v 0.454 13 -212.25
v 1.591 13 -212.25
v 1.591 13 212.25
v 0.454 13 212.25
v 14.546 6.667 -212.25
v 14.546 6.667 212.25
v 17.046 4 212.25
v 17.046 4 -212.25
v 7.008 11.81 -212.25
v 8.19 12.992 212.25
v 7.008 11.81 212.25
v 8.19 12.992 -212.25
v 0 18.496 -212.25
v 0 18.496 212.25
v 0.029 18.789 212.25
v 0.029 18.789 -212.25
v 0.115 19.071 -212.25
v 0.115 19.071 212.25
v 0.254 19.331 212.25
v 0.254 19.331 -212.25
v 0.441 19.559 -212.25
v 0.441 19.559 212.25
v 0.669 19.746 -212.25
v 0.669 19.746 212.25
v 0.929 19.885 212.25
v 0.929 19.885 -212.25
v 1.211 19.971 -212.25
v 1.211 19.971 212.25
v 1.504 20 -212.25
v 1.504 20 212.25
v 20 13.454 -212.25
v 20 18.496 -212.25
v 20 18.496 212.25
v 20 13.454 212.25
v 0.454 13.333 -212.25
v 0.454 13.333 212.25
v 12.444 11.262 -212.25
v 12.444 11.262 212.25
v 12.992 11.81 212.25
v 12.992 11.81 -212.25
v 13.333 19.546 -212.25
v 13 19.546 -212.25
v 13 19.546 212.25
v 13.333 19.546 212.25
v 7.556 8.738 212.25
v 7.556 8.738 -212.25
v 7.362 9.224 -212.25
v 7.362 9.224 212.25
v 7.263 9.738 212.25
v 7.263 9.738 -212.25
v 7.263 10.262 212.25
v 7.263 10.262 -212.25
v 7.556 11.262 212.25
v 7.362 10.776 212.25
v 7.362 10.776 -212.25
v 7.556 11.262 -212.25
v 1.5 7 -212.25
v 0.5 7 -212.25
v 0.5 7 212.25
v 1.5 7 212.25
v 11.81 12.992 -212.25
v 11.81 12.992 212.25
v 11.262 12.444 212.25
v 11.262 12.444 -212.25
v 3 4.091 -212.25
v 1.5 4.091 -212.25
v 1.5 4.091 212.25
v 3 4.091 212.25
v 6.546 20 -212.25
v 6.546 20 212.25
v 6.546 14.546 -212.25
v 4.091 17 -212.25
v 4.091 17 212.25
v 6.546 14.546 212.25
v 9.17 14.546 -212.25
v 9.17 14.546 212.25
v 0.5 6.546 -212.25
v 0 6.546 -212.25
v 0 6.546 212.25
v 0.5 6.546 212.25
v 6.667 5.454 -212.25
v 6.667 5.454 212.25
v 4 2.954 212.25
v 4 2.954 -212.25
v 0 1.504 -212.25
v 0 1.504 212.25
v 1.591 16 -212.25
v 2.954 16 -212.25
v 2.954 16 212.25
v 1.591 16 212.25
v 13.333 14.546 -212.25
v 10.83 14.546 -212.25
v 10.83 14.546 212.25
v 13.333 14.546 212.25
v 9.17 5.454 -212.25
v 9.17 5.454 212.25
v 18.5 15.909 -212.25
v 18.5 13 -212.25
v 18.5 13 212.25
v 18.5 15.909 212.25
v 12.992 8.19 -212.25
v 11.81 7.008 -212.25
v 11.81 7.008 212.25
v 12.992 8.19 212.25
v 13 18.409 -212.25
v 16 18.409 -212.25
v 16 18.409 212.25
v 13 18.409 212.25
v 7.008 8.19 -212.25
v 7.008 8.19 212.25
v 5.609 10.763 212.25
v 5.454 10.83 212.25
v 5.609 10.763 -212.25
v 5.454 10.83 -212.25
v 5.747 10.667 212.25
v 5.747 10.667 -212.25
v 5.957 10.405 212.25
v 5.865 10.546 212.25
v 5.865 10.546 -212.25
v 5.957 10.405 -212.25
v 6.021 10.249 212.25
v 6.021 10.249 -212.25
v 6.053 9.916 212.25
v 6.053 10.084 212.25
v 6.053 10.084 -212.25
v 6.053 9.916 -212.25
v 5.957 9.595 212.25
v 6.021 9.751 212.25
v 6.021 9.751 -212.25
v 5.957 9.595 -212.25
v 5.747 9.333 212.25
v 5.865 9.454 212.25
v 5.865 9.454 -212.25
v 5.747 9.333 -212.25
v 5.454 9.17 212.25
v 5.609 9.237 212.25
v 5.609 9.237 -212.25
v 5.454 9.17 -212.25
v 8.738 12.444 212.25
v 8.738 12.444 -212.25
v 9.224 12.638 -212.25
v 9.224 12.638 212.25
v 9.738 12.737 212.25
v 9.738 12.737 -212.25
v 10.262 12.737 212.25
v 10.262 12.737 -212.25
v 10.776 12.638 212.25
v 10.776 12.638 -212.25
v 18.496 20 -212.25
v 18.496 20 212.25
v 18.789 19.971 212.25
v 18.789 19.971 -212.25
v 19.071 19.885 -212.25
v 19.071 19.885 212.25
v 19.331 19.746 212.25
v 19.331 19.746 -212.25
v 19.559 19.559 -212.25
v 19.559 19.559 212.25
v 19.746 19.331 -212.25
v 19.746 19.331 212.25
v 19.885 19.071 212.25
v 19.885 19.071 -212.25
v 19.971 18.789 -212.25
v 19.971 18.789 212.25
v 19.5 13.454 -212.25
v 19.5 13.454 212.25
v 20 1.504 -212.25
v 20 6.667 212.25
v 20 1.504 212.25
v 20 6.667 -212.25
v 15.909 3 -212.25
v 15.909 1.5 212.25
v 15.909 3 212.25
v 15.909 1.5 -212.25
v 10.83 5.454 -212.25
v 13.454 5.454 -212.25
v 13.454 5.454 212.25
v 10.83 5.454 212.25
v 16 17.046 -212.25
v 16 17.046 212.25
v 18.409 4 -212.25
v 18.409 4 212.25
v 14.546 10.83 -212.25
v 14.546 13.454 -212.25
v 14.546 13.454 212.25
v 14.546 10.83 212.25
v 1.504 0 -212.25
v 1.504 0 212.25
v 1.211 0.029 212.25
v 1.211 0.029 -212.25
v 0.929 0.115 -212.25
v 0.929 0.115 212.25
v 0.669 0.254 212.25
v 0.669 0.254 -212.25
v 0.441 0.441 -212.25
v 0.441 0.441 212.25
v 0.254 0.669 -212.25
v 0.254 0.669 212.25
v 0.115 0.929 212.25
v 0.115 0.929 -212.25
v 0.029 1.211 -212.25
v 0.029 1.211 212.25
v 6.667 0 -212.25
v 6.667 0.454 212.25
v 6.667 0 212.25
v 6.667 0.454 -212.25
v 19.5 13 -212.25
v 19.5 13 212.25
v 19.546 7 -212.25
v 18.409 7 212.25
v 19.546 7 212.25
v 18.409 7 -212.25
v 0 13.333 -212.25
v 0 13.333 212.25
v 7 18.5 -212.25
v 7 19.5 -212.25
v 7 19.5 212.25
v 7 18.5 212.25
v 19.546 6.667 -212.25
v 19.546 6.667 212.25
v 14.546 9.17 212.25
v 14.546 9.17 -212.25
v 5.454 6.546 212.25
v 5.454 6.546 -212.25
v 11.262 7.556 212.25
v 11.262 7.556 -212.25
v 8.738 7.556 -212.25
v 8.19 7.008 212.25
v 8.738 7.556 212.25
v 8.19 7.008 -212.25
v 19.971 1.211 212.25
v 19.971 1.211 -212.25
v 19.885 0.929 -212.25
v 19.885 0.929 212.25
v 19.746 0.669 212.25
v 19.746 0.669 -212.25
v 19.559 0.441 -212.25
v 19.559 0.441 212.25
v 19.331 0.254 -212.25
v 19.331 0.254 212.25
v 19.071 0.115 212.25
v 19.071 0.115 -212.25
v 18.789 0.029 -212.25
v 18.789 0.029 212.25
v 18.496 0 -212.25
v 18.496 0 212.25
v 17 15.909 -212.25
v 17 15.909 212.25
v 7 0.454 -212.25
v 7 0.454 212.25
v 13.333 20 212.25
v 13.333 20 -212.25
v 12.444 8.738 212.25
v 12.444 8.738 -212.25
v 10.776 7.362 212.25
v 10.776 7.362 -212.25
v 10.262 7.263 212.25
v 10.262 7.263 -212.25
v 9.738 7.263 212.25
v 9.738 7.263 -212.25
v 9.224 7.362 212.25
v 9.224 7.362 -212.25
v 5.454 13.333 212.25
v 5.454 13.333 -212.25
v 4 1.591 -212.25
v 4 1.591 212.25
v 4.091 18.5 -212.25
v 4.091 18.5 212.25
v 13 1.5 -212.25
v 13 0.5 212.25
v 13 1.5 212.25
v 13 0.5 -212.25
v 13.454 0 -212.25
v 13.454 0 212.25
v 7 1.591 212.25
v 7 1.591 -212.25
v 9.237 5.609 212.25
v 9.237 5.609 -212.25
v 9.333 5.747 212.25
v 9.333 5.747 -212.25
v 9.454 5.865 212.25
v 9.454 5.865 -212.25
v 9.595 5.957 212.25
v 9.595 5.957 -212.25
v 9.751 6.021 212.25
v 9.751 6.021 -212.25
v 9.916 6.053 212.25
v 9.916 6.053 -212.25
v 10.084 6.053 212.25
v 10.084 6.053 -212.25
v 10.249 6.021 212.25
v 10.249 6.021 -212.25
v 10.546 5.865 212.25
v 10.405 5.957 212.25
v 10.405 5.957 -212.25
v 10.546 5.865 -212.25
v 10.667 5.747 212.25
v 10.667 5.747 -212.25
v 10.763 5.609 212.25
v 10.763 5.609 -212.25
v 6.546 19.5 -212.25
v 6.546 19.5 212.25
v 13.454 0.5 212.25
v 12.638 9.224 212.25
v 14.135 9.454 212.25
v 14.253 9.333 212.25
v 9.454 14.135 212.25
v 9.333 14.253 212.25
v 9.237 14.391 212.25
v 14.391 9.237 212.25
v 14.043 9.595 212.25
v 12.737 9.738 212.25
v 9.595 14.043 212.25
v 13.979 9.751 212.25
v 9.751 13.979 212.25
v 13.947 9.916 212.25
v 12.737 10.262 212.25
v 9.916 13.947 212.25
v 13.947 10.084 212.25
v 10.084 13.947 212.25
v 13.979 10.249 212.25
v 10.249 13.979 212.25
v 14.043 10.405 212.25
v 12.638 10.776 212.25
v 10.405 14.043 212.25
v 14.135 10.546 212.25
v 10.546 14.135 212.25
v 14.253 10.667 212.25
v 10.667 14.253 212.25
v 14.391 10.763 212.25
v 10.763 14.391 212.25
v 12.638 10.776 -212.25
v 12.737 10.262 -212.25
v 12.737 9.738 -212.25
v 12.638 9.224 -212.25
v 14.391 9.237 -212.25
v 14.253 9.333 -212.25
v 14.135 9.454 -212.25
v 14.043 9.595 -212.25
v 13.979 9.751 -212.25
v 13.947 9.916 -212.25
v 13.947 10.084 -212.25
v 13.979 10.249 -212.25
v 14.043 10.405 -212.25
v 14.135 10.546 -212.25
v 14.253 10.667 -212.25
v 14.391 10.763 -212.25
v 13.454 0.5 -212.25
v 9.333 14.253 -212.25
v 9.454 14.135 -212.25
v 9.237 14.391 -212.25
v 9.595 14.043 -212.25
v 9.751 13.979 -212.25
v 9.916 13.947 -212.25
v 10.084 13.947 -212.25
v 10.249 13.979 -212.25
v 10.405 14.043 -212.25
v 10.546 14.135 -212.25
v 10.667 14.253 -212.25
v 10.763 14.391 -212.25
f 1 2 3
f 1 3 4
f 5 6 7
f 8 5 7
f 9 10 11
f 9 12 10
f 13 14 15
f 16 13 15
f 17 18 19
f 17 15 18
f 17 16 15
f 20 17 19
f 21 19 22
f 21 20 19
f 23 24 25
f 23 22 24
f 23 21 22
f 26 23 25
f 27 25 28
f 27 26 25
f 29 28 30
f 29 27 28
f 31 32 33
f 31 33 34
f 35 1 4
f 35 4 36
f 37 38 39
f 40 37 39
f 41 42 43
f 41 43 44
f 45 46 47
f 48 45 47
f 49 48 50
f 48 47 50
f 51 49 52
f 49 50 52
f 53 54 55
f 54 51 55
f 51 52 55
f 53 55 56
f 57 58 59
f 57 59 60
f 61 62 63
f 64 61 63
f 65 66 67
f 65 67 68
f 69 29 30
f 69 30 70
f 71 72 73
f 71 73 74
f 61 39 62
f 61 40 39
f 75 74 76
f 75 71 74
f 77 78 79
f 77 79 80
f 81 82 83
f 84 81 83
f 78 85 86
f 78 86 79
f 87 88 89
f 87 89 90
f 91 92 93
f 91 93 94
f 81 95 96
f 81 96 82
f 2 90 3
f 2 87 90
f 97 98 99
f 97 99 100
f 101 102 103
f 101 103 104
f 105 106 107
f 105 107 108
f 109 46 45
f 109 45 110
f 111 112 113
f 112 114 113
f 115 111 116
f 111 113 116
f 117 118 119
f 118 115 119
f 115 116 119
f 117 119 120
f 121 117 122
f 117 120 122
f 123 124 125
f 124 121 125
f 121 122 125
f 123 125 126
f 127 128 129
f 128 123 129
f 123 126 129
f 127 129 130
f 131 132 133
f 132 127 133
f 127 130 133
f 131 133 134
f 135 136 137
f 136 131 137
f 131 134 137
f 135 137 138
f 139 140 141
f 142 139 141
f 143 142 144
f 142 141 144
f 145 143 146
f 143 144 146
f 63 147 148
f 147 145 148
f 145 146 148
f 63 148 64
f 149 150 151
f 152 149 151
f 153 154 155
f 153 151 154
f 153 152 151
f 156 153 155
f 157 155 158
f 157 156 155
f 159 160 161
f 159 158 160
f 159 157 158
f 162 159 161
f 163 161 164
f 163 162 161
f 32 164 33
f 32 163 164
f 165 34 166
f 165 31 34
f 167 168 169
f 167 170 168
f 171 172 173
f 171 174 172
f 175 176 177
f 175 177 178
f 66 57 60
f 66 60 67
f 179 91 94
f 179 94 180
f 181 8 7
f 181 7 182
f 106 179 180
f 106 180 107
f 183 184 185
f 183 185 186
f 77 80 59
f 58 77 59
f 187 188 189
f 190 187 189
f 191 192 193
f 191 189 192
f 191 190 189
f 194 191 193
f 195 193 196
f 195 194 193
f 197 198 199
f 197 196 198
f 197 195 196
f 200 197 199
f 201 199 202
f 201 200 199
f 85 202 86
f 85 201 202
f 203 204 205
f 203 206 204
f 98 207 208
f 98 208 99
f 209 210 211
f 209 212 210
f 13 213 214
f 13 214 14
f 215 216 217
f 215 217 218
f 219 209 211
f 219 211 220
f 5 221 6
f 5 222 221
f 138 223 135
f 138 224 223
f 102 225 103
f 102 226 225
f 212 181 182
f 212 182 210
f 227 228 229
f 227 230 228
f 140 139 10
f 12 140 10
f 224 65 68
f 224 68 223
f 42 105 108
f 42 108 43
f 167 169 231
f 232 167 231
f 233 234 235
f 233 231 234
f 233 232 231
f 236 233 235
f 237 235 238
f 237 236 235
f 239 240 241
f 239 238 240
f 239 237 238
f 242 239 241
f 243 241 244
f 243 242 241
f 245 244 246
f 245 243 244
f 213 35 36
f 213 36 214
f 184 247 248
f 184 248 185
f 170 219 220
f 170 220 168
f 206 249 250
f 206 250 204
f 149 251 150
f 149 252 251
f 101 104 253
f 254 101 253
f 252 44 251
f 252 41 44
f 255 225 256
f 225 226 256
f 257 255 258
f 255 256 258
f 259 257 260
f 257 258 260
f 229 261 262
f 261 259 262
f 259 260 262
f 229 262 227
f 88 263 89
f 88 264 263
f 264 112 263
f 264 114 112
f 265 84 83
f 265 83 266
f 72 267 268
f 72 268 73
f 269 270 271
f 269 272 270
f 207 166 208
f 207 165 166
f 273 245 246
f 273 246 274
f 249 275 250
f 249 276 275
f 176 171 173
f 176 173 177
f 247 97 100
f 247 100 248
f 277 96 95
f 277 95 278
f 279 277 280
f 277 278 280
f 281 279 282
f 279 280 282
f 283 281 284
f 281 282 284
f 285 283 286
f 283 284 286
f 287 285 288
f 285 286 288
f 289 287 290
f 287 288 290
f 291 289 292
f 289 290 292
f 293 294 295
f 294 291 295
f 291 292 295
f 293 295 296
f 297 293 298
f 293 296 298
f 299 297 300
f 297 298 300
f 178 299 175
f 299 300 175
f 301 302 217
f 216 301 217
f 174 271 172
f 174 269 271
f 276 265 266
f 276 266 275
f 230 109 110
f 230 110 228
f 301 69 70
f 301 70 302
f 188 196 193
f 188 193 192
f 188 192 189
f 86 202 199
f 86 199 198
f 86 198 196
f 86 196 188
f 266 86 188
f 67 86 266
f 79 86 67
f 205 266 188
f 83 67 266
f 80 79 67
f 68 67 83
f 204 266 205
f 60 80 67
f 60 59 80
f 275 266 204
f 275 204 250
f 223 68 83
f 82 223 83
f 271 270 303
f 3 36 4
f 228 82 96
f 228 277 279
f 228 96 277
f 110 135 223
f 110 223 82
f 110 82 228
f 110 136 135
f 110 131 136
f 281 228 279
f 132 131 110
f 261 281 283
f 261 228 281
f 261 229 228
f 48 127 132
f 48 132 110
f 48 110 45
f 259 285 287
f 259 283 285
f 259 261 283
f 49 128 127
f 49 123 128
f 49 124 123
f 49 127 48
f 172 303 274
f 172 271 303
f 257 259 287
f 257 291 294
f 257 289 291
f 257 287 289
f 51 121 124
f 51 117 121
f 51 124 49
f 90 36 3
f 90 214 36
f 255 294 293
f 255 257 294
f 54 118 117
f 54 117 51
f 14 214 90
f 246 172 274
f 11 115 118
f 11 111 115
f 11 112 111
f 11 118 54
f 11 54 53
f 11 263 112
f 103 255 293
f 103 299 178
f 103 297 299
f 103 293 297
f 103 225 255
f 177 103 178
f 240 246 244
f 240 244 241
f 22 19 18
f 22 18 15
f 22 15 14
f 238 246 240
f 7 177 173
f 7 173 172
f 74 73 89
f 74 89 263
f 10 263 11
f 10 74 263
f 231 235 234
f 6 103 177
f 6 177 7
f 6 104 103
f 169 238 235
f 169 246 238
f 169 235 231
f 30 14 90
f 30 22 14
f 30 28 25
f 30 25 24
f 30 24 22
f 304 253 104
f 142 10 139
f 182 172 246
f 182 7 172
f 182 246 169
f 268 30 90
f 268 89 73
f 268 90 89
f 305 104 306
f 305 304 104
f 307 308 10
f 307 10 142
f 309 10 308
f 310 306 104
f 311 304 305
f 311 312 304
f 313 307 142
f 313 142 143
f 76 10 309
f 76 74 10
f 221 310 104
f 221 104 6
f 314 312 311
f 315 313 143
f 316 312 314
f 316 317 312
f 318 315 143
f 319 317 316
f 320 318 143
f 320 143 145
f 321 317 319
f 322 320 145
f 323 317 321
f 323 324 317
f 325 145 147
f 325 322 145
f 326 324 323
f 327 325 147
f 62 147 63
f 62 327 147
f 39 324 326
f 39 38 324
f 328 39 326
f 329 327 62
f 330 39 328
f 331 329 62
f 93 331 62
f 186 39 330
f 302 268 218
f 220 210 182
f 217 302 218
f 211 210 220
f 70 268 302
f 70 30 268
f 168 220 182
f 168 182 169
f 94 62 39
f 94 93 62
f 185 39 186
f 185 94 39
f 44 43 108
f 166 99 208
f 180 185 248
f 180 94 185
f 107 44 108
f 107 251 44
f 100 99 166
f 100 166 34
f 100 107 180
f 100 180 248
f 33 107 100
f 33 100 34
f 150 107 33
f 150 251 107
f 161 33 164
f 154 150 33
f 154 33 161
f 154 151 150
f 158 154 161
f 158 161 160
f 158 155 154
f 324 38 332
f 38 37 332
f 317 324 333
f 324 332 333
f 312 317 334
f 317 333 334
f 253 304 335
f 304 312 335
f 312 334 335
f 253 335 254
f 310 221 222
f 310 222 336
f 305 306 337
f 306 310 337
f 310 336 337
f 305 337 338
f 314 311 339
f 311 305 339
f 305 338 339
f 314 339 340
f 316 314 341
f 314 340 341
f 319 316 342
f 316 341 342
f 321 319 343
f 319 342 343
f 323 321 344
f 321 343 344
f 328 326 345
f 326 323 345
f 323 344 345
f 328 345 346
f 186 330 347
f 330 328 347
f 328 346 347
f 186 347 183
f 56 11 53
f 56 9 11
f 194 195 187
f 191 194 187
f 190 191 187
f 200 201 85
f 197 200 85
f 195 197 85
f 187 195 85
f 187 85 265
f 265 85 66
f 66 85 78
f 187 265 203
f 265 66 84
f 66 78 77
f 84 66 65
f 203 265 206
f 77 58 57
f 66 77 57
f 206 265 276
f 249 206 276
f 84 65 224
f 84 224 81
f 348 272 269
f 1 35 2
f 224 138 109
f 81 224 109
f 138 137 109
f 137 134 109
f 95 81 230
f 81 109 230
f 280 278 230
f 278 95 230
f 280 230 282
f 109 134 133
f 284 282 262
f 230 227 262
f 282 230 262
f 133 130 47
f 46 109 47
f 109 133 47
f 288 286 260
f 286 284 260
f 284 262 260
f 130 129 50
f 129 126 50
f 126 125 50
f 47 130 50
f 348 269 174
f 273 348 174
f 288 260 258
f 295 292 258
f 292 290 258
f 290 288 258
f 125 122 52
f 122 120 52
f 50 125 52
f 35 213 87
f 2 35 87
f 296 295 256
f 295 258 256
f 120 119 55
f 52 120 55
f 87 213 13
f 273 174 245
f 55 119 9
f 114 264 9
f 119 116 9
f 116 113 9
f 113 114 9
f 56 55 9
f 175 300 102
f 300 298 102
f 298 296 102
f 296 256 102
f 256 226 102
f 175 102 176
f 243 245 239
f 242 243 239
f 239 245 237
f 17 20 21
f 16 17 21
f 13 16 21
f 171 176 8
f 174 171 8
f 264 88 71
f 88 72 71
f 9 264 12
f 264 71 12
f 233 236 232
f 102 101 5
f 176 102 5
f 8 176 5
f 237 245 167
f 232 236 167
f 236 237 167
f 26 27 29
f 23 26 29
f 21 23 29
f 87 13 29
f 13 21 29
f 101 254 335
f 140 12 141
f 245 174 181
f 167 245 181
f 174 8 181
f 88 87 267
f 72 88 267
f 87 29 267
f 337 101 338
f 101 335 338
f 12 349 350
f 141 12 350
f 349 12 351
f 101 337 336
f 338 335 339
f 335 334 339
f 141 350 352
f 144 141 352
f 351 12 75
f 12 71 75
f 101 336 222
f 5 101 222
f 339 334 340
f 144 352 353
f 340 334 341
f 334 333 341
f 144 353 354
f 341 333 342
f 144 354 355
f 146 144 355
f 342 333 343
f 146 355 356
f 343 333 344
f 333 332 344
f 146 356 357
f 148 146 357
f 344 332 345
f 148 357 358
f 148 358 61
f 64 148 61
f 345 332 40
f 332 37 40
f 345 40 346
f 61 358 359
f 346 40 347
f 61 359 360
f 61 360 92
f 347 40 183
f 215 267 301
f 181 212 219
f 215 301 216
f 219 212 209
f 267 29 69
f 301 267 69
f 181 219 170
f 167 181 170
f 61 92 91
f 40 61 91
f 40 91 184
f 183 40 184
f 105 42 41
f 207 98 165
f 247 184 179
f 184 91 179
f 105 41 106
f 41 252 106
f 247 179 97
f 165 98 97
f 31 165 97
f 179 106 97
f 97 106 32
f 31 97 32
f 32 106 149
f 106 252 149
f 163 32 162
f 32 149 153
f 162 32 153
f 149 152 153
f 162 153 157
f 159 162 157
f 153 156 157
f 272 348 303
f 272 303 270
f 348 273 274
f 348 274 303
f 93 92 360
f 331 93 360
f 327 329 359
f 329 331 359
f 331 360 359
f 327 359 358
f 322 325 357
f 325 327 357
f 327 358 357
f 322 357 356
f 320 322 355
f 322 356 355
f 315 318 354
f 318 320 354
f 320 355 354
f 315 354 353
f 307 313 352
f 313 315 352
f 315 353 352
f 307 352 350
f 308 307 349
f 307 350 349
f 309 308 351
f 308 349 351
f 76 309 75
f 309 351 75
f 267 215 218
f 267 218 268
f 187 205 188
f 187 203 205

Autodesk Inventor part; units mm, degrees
ref_plane "YZ Plane" through (0, 0, 0) normal (1, 0, 0) x (0, 1, 0)
ref_plane "XZ Plane" through (0, 0, 0) normal (0, 1, 0) x (-1, 0, 0)
ref_plane "XY Plane" through (0, 0, 0) normal (0, 0, 1) x (1, 0, 0)
sketch "Sketch1" plane through (0, 0, 0) normal (0, 0, 1) x (1, 0, 0)
  line L0 (11.2616, 7.5565) -> (11.8104, 7.0077)
  line L1 (11.8104, 7.0077) -> (12.9923, 8.1896)
  line L2 (12.9923, 8.1896) -> (12.4435, 8.7384)
  arc A0 (12.4435, 8.7384) -> (12.4435, 11.2616) centre (10, 10) ccw
  line L3 (12.4435, 11.2616) -> (12.9923, 11.8104)
  line L4 (12.9923, 11.8104) -> (11.8104, 12.9923)
  line L5 (11.8104, 12.9923) -> (11.2616, 12.4435)
  arc A1 (11.2616, 12.4435) -> (8.7384, 12.4435) centre (10, 10) ccw
  line L6 (8.7384, 12.4435) -> (8.1896, 12.9923)
  line L7 (8.1896, 12.9923) -> (7.0077, 11.8104)
  line L8 (7.0077, 11.8104) -> (7.5565, 11.2616)
  arc A2 (7.5565, 11.2616) -> (7.5565, 8.7384) centre (10, 10) ccw
  line L9 (7.5565, 8.7384) -> (7.0077, 8.1896)
  line L10 (7.0077, 8.1896) -> (8.1896, 7.0077)
  line L11 (8.1896, 7.0077) -> (8.7384, 7.5565)
  arc A3 (8.7384, 7.5565) -> (11.2616, 7.5565) centre (10, 10) ccw
  line L12 (13.4545, 0) -> (13.4545, 0.5)
  line L13 (13.4545, 0.5) -> (13, 0.5)
  line L14 (13, 0.5) -> (13, 1.5)
  line L15 (13, 1.5) -> (15.9091, 1.5)
  line L16 (15.9091, 1.5) -> (15.9091, 3)
  line L17 (15.9091, 3) -> (13.4545, 5.4545)
  line L18 (13.4545, 5.4545) -> (10.8302, 5.4545)
  arc A4 (10.8302, 5.4545) -> (9.1698, 5.4545) centre (10, 5.1837) ccw
  line L19 (9.1698, 5.4545) -> (6.6667, 5.4545)
  line L20 (6.6667, 5.4545) -> (4, 2.9545)
  line L21 (4, 2.9545) -> (4, 1.5909)
  line L22 (4, 1.5909) -> (7, 1.5909)
  line L23 (7, 1.5909) -> (7, 0.4545)
  line L24 (7, 0.4545) -> (6.6667, 0.4545)
  line L25 (6.6667, 0.4545) -> (6.6667, 0)
  line L26 (6.6667, 0) -> (1.5043, 0)
  arc A5 (0, 1.5043) -> (1.5043, 0) centre (1.5043, 1.5043) ccw
  line L27 (0, 1.5043) -> (0, 6.5455)
  line L28 (0, 6.5455) -> (0.5, 6.5455)
  line L29 (0.5, 6.5455) -> (0.5, 7)
  line L30 (0.5, 7) -> (1.5, 7)
  line L31 (1.5, 7) -> (1.5, 4.0909)
  line L32 (1.5, 4.0909) -> (3, 4.0909)
  line L33 (3, 4.0909) -> (5.4545, 6.5455)
  line L34 (5.4545, 6.5455) -> (5.4545, 9.1698)
  arc A6 (5.4545, 9.1698) -> (5.4545, 10.8302) centre (5.1837, 10) ccw
  line L35 (5.4545, 10.8302) -> (5.4545, 13.3333)
  line L36 (5.4545, 13.3333) -> (2.9545, 16)
  line L37 (2.9545, 16) -> (1.5909, 16)
  line L38 (1.5909, 16) -> (1.5909, 13)
  line L39 (1.5909, 13) -> (0.4545, 13)
  line L40 (0.4545, 13) -> (0.4545, 13.3333)
  line L41 (0.4545, 13.3333) -> (0, 13.3333)
  line L42 (0, 13.3333) -> (0, 18.4957)
  arc A7 (1.5043, 20) -> (0, 18.4957) centre (1.5043, 18.4957) ccw
  line L43 (1.5043, 20) -> (6.5455, 20)
  line L44 (6.5455, 20) -> (6.5455, 19.5)
  line L45 (6.5455, 19.5) -> (7, 19.5)
  line L46 (7, 19.5) -> (7, 18.5)
  line L47 (7, 18.5) -> (4.0909, 18.5)
  line L48 (4.0909, 18.5) -> (4.0909, 17)
  line L49 (4.0909, 17) -> (6.5455, 14.5455)
  line L50 (6.5455, 14.5455) -> (9.1698, 14.5455)
  arc A8 (9.1698, 14.5455) -> (10.8302, 14.5455) centre (10, 14.8163) ccw
  line L51 (10.8302, 14.5455) -> (13.3333, 14.5455)
  line L52 (13.3333, 14.5455) -> (16, 17.0455)
  line L53 (16, 17.0455) -> (16, 18.4091)
  line L54 (16, 18.4091) -> (13, 18.4091)
  line L55 (13, 18.4091) -> (13, 19.5455)
  line L56 (13, 19.5455) -> (13.3333, 19.5455)
  line L57 (13.3333, 19.5455) -> (13.3333, 20)
  line L58 (13.3333, 20) -> (18.4957, 20)
  arc A9 (20, 18.4957) -> (18.4957, 20) centre (18.4957, 18.4957) ccw
  line L59 (20, 18.4957) -> (20, 13.4545)
  line L60 (20, 13.4545) -> (19.5, 13.4545)
  line L61 (19.5, 13.4545) -> (19.5, 13)
  line L62 (19.5, 13) -> (18.5, 13)
  line L63 (18.5, 13) -> (18.5, 15.9091)
  line L64 (18.5, 15.9091) -> (17, 15.9091)
  line L65 (17, 15.9091) -> (14.5455, 13.4545)
  line L66 (14.5455, 13.4545) -> (14.5455, 10.8302)
  arc A10 (14.5455, 10.8302) -> (14.5455, 9.1698) centre (14.8163, 10) ccw
  line L67 (14.5455, 9.1698) -> (14.5455, 6.6667)
  line L68 (14.5455, 6.6667) -> (17.0455, 4)
  line L69 (17.0455, 4) -> (18.4091, 4)
  line L70 (18.4091, 4) -> (18.4091, 7)
  line L71 (18.4091, 7) -> (19.5455, 7)
  line L72 (19.5455, 7) -> (19.5455, 6.6667)
  line L73 (19.5455, 6.6667) -> (20, 6.6667)
  line L74 (20, 6.6667) -> (20, 1.5043)
  arc A11 (18.4957, 0) -> (20, 1.5043) centre (18.4957, 1.5043) ccw
  line L75 (18.4957, 0) -> (13.4545, 0)
  point P0 (0, 0)
  point P1 (0.4406, 0.4406)
  point P2 (10, 0)
  point P3 (10, 0)
  point P4 (10, 0)
  point P5 (19.5594, 0.4406)
  point P6 (0, 10)
  point P7 (0, 10)
  point P8 (0, 10)
  point P9 (10, 10)
  point P10 (20, 10)
  point P11 (20, 10)
  point P12 (20, 10)
  point P13 (0.4406, 19.5594)
  point P14 (10, 20)
  point P15 (10, 20)
  point P16 (10, 20)
  point P17 (19.5594, 19.5594)
extrude "Extrusion1" add sketch "Sketch1" along normal mid plane 424.5
properties part number "short side"
